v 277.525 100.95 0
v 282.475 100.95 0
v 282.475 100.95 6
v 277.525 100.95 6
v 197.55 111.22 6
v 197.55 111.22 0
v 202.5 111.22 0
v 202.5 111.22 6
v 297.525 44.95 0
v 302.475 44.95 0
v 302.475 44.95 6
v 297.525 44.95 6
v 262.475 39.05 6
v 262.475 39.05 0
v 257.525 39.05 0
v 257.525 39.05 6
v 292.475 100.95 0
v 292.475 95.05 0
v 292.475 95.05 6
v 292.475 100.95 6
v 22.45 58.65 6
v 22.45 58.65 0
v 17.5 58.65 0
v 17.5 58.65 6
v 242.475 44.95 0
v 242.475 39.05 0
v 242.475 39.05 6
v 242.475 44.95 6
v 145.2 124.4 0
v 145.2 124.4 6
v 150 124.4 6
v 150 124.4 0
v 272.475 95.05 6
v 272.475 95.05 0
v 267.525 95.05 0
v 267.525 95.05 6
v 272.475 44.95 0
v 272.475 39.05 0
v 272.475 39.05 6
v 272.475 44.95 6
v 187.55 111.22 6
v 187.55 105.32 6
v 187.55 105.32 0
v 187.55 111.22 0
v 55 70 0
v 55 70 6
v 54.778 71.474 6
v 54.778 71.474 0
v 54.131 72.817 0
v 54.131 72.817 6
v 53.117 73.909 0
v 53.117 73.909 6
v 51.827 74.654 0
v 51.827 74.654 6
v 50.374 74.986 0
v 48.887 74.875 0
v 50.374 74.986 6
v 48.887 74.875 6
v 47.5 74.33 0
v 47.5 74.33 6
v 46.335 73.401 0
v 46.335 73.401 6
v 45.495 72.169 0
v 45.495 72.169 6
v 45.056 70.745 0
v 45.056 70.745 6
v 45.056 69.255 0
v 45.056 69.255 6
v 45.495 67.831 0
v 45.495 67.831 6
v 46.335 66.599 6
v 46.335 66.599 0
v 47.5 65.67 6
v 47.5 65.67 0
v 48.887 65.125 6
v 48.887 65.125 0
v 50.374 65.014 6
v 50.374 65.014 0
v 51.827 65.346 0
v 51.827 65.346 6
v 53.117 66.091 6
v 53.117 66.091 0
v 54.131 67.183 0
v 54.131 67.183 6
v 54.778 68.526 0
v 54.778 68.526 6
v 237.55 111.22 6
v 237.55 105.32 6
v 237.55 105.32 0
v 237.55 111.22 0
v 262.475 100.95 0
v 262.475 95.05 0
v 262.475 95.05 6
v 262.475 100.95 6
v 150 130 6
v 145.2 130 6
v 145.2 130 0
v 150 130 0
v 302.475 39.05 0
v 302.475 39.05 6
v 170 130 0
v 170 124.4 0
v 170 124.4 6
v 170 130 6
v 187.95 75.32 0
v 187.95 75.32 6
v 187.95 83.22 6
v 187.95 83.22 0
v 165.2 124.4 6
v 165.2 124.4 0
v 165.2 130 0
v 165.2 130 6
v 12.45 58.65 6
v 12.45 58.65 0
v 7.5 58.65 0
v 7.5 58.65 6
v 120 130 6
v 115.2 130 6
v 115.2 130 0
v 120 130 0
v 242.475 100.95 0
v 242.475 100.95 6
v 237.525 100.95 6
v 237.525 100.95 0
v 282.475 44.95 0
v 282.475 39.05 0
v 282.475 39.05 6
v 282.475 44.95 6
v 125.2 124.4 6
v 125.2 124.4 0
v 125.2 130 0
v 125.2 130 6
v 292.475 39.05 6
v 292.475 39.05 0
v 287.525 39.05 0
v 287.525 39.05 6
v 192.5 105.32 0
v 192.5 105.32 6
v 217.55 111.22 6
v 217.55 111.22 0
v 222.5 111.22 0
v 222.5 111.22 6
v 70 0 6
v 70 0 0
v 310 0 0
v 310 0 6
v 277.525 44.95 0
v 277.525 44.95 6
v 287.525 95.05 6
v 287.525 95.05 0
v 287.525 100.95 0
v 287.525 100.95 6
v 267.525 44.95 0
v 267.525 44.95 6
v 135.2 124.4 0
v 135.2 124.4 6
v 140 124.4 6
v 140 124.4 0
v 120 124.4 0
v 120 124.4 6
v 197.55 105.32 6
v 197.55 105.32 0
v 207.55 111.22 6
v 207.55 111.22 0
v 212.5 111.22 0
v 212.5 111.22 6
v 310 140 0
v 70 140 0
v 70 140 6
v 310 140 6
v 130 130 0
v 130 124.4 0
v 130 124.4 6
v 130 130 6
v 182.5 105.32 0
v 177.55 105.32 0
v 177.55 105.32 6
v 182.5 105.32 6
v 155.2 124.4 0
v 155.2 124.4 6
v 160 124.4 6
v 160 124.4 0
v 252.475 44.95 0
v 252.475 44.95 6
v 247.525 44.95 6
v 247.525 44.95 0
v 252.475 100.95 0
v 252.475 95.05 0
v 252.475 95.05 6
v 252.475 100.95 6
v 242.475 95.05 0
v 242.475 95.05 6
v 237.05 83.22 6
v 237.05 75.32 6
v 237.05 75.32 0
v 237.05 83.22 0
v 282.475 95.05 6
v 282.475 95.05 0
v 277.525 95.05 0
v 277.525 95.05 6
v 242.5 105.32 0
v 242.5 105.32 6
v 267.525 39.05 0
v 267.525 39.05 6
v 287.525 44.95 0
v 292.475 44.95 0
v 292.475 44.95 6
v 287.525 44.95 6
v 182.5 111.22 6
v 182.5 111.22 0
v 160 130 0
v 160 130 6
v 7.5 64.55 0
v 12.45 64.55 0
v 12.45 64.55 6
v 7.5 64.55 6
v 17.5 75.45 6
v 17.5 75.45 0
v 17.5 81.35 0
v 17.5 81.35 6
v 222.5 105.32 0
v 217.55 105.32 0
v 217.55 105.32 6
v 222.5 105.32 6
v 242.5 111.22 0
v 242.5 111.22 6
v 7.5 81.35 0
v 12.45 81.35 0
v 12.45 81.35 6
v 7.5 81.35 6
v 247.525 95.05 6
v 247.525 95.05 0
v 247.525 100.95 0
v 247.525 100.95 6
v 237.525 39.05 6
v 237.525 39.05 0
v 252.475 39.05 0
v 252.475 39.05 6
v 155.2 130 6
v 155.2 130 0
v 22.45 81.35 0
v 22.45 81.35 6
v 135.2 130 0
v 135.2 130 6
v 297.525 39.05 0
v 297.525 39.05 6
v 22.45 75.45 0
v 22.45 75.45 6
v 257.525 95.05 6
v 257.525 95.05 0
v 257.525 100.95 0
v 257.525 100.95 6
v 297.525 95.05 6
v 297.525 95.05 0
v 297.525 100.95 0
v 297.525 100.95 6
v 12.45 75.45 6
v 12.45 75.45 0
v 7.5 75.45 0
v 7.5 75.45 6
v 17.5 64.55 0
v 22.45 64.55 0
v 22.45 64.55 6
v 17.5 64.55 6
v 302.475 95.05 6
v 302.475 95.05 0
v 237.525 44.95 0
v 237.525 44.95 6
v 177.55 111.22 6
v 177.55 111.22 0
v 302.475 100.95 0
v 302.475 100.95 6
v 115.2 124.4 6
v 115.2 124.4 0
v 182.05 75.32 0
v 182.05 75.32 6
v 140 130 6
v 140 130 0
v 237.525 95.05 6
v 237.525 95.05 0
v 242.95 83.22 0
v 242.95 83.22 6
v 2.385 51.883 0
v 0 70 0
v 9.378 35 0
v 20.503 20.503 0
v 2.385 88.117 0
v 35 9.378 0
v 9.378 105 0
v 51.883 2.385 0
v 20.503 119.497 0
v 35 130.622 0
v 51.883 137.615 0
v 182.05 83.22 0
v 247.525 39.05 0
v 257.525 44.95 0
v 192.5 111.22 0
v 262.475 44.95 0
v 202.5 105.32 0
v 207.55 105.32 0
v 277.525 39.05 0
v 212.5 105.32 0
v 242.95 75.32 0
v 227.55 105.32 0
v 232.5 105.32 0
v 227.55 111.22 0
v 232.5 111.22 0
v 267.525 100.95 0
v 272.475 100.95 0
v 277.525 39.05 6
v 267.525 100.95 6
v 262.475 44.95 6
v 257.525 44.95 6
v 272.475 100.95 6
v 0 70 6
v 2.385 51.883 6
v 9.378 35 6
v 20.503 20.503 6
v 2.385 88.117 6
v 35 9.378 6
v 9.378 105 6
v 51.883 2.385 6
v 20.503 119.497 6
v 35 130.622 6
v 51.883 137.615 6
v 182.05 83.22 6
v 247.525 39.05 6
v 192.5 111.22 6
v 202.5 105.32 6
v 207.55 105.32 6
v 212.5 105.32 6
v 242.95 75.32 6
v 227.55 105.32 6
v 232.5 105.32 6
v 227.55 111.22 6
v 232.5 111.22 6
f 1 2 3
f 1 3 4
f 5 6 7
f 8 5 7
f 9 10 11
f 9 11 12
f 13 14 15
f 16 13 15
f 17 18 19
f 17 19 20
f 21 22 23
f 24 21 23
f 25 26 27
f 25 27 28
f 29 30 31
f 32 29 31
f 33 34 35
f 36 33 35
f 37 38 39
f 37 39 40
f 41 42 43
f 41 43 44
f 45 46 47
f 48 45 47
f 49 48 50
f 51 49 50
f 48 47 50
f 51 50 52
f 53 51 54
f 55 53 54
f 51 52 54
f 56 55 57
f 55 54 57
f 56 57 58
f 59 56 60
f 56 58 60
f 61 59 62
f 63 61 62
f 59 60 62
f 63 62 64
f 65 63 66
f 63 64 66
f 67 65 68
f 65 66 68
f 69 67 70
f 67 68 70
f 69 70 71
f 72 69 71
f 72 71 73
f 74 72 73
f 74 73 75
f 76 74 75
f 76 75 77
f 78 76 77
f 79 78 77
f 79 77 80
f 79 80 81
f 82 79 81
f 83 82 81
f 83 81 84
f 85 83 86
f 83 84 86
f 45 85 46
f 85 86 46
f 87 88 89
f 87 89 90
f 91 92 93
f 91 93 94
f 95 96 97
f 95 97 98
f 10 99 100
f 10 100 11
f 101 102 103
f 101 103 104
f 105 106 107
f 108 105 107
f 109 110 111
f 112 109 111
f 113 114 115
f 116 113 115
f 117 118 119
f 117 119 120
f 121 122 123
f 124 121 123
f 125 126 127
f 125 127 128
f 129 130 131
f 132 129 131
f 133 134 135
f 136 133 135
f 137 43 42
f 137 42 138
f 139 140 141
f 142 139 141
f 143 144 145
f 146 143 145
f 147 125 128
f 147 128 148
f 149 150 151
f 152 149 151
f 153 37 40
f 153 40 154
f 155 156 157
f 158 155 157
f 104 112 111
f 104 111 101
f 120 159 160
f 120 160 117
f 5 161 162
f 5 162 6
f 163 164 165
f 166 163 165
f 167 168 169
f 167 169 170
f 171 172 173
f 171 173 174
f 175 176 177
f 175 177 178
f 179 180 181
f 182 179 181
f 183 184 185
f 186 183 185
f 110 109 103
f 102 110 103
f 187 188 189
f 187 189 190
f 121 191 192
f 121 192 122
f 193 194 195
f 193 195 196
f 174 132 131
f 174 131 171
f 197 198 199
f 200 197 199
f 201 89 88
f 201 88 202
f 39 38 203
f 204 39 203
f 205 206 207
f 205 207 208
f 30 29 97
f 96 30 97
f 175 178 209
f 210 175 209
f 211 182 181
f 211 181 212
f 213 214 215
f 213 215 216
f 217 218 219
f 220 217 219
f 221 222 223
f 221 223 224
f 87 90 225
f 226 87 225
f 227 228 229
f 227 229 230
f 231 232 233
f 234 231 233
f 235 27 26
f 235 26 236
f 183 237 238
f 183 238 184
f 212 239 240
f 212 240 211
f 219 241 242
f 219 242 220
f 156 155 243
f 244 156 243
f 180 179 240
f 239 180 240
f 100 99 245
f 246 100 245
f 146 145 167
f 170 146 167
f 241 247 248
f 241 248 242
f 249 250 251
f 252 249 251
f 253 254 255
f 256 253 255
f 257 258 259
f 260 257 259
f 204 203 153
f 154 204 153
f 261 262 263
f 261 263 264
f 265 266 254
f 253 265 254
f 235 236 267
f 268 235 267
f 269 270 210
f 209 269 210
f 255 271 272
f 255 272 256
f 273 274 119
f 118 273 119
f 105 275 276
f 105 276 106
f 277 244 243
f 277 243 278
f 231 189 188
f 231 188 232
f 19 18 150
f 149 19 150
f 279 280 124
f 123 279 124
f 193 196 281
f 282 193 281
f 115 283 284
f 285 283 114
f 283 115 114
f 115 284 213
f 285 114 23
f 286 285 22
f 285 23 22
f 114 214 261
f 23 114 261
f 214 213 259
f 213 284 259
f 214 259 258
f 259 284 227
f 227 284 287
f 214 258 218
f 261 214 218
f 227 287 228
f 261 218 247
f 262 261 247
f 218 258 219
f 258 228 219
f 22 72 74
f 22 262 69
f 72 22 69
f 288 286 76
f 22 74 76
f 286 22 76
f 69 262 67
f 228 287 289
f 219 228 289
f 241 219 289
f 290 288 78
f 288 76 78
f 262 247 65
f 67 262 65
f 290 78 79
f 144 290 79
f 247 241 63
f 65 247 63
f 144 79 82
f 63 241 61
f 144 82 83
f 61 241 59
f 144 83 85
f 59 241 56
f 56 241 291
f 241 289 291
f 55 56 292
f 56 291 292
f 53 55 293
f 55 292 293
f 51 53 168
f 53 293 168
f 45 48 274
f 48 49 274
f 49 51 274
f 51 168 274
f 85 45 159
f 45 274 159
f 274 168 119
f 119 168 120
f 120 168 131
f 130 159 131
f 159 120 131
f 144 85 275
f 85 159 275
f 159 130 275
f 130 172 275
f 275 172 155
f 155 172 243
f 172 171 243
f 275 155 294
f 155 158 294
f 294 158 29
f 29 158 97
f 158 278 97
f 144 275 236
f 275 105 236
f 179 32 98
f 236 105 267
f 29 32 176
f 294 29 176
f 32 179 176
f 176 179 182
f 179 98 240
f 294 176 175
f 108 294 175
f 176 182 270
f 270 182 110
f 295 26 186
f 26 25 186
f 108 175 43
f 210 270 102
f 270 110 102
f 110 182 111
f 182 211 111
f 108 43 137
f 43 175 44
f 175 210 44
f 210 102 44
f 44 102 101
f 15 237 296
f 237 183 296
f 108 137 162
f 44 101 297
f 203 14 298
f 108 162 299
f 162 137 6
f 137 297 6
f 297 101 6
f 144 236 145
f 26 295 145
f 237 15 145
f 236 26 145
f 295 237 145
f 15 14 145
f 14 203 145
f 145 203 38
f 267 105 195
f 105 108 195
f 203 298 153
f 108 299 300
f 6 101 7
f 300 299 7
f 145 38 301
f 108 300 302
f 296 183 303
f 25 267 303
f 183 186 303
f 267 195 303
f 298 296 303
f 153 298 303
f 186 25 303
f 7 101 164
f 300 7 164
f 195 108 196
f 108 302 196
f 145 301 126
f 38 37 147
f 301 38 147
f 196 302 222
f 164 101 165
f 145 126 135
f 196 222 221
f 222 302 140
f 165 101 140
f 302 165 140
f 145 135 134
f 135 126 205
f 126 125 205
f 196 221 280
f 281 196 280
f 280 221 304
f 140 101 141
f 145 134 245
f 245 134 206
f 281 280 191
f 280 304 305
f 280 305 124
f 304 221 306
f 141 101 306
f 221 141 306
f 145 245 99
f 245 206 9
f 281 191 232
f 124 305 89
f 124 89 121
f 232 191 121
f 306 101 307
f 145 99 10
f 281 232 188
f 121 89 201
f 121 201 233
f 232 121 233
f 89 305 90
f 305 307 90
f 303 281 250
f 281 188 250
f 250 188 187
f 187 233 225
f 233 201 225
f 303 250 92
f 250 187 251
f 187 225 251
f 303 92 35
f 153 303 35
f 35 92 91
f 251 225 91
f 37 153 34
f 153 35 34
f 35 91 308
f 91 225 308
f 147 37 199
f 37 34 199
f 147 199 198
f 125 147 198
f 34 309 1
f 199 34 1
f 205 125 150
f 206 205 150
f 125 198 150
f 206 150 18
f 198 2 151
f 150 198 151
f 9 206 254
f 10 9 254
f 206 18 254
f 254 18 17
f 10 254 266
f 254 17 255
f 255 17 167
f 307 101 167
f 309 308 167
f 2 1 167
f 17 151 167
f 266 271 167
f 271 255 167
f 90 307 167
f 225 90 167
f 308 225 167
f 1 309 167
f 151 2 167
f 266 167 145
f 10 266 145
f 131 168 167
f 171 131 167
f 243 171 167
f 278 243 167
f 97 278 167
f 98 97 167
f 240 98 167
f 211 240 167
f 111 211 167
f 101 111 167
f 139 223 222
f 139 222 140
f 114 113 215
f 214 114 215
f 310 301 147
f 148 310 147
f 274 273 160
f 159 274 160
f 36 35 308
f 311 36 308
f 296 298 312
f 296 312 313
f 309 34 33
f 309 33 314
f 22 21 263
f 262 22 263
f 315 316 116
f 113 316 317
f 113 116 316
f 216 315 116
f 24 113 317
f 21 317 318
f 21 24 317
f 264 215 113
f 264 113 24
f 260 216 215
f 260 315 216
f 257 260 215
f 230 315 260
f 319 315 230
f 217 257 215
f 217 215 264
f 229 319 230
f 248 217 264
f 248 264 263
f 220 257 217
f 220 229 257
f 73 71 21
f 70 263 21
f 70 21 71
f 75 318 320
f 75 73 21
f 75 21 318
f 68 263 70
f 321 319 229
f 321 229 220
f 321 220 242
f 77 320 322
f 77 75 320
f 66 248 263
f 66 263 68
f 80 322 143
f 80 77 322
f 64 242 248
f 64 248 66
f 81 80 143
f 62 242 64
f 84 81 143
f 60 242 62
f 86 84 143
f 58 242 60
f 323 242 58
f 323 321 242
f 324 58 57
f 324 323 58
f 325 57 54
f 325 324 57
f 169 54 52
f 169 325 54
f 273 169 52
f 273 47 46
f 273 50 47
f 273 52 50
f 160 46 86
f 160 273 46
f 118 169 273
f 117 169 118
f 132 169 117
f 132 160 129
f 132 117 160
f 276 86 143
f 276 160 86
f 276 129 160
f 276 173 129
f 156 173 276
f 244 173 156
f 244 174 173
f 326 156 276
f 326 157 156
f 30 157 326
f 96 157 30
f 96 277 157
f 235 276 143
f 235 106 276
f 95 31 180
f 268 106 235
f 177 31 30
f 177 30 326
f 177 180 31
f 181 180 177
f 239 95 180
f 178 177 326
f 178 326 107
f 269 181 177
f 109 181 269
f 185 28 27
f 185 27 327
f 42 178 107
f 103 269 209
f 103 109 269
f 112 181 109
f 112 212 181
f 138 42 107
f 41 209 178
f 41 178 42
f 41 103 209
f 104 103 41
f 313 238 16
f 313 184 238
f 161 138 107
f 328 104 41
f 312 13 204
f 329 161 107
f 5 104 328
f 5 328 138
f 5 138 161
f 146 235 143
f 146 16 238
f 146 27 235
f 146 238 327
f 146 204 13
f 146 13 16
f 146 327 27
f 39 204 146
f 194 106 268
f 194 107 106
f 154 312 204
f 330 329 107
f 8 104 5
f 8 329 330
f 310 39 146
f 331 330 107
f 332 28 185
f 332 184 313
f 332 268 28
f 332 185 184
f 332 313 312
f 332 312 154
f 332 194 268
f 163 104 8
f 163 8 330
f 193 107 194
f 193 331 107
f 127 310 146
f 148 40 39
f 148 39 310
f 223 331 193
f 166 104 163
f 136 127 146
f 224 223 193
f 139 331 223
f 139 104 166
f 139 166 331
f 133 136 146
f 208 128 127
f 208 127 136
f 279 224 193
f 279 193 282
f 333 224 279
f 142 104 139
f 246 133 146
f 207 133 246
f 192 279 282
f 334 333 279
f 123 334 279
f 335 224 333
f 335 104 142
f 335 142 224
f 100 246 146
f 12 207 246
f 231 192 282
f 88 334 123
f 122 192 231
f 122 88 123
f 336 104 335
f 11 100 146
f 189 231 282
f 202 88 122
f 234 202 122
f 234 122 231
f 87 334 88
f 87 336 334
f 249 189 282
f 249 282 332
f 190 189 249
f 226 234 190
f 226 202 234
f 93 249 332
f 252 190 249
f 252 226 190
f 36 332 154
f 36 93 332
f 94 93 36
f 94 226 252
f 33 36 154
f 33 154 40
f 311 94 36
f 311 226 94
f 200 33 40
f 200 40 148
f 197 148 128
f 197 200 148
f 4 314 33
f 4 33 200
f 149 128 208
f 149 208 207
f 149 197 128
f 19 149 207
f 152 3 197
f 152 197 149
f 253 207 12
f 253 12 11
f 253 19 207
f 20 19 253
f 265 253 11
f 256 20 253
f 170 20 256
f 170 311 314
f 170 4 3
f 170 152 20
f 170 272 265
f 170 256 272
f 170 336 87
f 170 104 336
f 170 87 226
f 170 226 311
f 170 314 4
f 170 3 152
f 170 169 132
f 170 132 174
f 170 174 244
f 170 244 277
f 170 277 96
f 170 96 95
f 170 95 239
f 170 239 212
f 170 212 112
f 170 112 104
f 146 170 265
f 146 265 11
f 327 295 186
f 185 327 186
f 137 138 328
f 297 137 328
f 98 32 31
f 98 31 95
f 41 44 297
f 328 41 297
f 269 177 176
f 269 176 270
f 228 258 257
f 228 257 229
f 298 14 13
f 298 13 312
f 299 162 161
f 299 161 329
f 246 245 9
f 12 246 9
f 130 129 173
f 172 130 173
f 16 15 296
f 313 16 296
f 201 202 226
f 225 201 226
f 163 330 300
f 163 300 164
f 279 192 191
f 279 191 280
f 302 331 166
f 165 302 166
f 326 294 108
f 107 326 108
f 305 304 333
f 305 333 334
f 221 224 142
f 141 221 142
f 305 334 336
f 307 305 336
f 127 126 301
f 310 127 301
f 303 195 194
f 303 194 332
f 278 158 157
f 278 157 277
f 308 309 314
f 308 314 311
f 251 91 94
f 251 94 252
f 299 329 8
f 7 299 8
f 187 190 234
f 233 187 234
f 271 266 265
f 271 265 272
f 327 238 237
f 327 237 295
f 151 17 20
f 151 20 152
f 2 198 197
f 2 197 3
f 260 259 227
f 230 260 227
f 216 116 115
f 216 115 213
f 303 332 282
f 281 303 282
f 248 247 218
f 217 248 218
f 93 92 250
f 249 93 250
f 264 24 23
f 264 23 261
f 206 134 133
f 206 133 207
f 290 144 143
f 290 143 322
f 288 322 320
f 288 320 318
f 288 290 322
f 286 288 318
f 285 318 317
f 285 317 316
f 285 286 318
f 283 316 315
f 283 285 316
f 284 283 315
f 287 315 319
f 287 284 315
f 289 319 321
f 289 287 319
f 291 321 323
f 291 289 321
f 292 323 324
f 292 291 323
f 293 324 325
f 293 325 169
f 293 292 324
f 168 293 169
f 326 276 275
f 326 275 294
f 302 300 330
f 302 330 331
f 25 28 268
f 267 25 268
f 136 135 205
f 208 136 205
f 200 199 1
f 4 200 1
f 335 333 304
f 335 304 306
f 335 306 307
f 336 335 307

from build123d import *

# Parameters (mm, degrees)
ESQUISSE1_W             = 310
ESQUISSE1_H             = 140
BOSS_EXTRU_1_DEPTH      = 6
ESQUISSE4_W             = 4.95
ESQUISSE4_H             = 5.9
ESQUISSE4_W_2           = 5.9
ESQUISSE4_H_2           = 7.9
ENL_V_MAT_EXTRU_3_DEPTH = 6
ESQUISSE5_W             = 4.95
ESQUISSE5_H             = 5.9
ENL_V_MAT_EXTRU_4_DEPTH = 6
ESQUISSE6_W             = 4.95
ESQUISSE6_H             = 5.9
ENL_V_MAT_EXTRU_5_DEPTH = 6
ENL_V_MAT_EXTRU_6_DEPTH = 6
ESQUISSE8_R             = 5
ENL_V_MAT_EXTRU_7_DEPTH = 6
ESQUISSE9_W             = 4.8
ESQUISSE9_H             = 5.6
ENL_V_MAT_EXTRU_8_DEPTH = 10


with BuildPart() as part:
    # Esquisse1 → Boss.-Extru.1 (new body)
    with BuildSketch(Plane.XY):
        with Locations((155, 70)):
            Rectangle(ESQUISSE1_W, ESQUISSE1_H)
    extrude(amount=BOSS_EXTRU_1_DEPTH)

    # Esquisse4 → Enlèv. mat.-Extru.3 (cut)
    with BuildSketch(Plane.XY.offset(6)):
        with Locations((190.025, 108.27)):
            Rectangle(ESQUISSE4_W, ESQUISSE4_H)
        with Locations((185, 79.27)):
            Rectangle(ESQUISSE4_W_2, ESQUISSE4_H_2)
        with Locations((240, 79.27)):
            Rectangle(ESQUISSE4_W_2, ESQUISSE4_H_2)
        with Locations((180.025, 108.27)):
            Rectangle(ESQUISSE4_W, ESQUISSE4_H)
        with Locations((200.025, 108.27)):
            Rectangle(ESQUISSE4_W, ESQUISSE4_H)
        with Locations((210.025, 108.27)):
            Rectangle(ESQUISSE4_W, ESQUISSE4_H)
        with Locations((220.025, 108.27)):
            Rectangle(ESQUISSE4_W, ESQUISSE4_H)
        with Locations((230.025, 108.27)):
            Rectangle(ESQUISSE4_W, ESQUISSE4_H)
        with Locations((240.025, 108.27)):
            Rectangle(ESQUISSE4_W, ESQUISSE4_H)
    extrude(amount=-ENL_V_MAT_EXTRU_3_DEPTH, mode=Mode.SUBTRACT)

    # Esquisse5 → Enlèv. mat.-Extru.4 (cut)
    with BuildSketch(Plane(origin=(0, 0, 0), x_dir=(-1, 0, 0), z_dir=(0, 0, -1))):
        with Locations((-300, 98)):
            Rectangle(ESQUISSE5_W, ESQUISSE5_H)
        with Locations((-290, 98)):
            Rectangle(ESQUISSE5_W, ESQUISSE5_H)
        with Locations((-280, 98)):
            Rectangle(ESQUISSE5_W, ESQUISSE5_H)
        with Locations((-270, 98)):
            Rectangle(ESQUISSE5_W, ESQUISSE5_H)
        with Locations((-260, 98)):
            Rectangle(ESQUISSE5_W, ESQUISSE5_H)
        with Locations((-250, 98)):
            Rectangle(ESQUISSE5_W, ESQUISSE5_H)
        with Locations((-240, 98)):
            Rectangle(ESQUISSE5_W, ESQUISSE5_H)
        with Locations((-240, 42)):
            Rectangle(ESQUISSE5_W, ESQUISSE5_H)
        with Locations((-250, 42)):
            Rectangle(ESQUISSE5_W, ESQUISSE5_H)
        with Locations((-260, 42)):
            Rectangle(ESQUISSE5_W, ESQUISSE5_H)
        with Locations((-270, 42)):
            Rectangle(ESQUISSE5_W, ESQUISSE5_H)
        with Locations((-280, 42)):
            Rectangle(ESQUISSE5_W, ESQUISSE5_H)
        with Locations((-300, 42)):
            Rectangle(ESQUISSE5_W, ESQUISSE5_H)
        with Locations((-290, 42)):
            Rectangle(ESQUISSE5_W, ESQUISSE5_H)
    extrude(amount=-ENL_V_MAT_EXTRU_4_DEPTH, mode=Mode.SUBTRACT)

    # Esquisse6 → Enlèv. mat.-Extru.5 (cut)
    with BuildSketch(Plane(origin=(0, 0, 0), x_dir=(-1, 0, 0), z_dir=(0, 0, -1))):
        with Locations((-9.975, 78.4)):
            Rectangle(ESQUISSE6_W, ESQUISSE6_H)
        with Locations((-19.975, 78.4)):
            Rectangle(ESQUISSE6_W, ESQUISSE6_H)
        with Locations((-9.975, 61.6)):
            Rectangle(ESQUISSE6_W, ESQUISSE6_H)
        with Locations((-19.975, 61.6)):
            Rectangle(ESQUISSE6_W, ESQUISSE6_H)
    extrude(amount=-ENL_V_MAT_EXTRU_5_DEPTH, mode=Mode.SUBTRACT)

    # Esquisse7 → Enlèv. mat.-Extru.6 (cut)
    with BuildSketch(Plane(origin=(0, 0, 0), x_dir=(-1, 0, 0), z_dir=(0, 0, -1))):
        with BuildLine():
            Line((-70, 140), (0, 140))
            Line((0, 140), (30, 140))
            Line((30, 140), (30, 0))
            Line((30, 0), (0, 0))
            Line((0, 0), (-70, 0))
            ThreePointArc((-70, 0), (0, 70), (-70, 140))
        make_face()
    extrude(amount=-ENL_V_MAT_EXTRU_6_DEPTH, mode=Mode.SUBTRACT)

    # Esquisse8 → Enlèv. mat.-Extru.7 (cut)
    with BuildSketch(Plane.XY.offset(6)):
        with Locations((50, 70)):
            Circle(ESQUISSE8_R)
    extrude(amount=-ENL_V_MAT_EXTRU_7_DEPTH, mode=Mode.SUBTRACT)

    # Esquisse9 → Enlèv. mat.-Extru.8 (cut)
    with BuildSketch(Plane.XY.offset(6)):
        with Locations((117.6, 127.2)):
            Rectangle(ESQUISSE9_W, ESQUISSE9_H)
        with Locations((127.6, 127.2)):
            Rectangle(ESQUISSE9_W, ESQUISSE9_H)
        with Locations((137.6, 127.2)):
            Rectangle(ESQUISSE9_W, ESQUISSE9_H)
        with Locations((147.6, 127.2)):
            Rectangle(ESQUISSE9_W, ESQUISSE9_H)
        with Locations((157.6, 127.2)):
            Rectangle(ESQUISSE9_W, ESQUISSE9_H)
        with Locations((167.6, 127.2)):
            Rectangle(ESQUISSE9_W, ESQUISSE9_H)
    extrude(amount=-ENL_V_MAT_EXTRU_8_DEPTH, mode=Mode.SUBTRACT)


solid = part.part
